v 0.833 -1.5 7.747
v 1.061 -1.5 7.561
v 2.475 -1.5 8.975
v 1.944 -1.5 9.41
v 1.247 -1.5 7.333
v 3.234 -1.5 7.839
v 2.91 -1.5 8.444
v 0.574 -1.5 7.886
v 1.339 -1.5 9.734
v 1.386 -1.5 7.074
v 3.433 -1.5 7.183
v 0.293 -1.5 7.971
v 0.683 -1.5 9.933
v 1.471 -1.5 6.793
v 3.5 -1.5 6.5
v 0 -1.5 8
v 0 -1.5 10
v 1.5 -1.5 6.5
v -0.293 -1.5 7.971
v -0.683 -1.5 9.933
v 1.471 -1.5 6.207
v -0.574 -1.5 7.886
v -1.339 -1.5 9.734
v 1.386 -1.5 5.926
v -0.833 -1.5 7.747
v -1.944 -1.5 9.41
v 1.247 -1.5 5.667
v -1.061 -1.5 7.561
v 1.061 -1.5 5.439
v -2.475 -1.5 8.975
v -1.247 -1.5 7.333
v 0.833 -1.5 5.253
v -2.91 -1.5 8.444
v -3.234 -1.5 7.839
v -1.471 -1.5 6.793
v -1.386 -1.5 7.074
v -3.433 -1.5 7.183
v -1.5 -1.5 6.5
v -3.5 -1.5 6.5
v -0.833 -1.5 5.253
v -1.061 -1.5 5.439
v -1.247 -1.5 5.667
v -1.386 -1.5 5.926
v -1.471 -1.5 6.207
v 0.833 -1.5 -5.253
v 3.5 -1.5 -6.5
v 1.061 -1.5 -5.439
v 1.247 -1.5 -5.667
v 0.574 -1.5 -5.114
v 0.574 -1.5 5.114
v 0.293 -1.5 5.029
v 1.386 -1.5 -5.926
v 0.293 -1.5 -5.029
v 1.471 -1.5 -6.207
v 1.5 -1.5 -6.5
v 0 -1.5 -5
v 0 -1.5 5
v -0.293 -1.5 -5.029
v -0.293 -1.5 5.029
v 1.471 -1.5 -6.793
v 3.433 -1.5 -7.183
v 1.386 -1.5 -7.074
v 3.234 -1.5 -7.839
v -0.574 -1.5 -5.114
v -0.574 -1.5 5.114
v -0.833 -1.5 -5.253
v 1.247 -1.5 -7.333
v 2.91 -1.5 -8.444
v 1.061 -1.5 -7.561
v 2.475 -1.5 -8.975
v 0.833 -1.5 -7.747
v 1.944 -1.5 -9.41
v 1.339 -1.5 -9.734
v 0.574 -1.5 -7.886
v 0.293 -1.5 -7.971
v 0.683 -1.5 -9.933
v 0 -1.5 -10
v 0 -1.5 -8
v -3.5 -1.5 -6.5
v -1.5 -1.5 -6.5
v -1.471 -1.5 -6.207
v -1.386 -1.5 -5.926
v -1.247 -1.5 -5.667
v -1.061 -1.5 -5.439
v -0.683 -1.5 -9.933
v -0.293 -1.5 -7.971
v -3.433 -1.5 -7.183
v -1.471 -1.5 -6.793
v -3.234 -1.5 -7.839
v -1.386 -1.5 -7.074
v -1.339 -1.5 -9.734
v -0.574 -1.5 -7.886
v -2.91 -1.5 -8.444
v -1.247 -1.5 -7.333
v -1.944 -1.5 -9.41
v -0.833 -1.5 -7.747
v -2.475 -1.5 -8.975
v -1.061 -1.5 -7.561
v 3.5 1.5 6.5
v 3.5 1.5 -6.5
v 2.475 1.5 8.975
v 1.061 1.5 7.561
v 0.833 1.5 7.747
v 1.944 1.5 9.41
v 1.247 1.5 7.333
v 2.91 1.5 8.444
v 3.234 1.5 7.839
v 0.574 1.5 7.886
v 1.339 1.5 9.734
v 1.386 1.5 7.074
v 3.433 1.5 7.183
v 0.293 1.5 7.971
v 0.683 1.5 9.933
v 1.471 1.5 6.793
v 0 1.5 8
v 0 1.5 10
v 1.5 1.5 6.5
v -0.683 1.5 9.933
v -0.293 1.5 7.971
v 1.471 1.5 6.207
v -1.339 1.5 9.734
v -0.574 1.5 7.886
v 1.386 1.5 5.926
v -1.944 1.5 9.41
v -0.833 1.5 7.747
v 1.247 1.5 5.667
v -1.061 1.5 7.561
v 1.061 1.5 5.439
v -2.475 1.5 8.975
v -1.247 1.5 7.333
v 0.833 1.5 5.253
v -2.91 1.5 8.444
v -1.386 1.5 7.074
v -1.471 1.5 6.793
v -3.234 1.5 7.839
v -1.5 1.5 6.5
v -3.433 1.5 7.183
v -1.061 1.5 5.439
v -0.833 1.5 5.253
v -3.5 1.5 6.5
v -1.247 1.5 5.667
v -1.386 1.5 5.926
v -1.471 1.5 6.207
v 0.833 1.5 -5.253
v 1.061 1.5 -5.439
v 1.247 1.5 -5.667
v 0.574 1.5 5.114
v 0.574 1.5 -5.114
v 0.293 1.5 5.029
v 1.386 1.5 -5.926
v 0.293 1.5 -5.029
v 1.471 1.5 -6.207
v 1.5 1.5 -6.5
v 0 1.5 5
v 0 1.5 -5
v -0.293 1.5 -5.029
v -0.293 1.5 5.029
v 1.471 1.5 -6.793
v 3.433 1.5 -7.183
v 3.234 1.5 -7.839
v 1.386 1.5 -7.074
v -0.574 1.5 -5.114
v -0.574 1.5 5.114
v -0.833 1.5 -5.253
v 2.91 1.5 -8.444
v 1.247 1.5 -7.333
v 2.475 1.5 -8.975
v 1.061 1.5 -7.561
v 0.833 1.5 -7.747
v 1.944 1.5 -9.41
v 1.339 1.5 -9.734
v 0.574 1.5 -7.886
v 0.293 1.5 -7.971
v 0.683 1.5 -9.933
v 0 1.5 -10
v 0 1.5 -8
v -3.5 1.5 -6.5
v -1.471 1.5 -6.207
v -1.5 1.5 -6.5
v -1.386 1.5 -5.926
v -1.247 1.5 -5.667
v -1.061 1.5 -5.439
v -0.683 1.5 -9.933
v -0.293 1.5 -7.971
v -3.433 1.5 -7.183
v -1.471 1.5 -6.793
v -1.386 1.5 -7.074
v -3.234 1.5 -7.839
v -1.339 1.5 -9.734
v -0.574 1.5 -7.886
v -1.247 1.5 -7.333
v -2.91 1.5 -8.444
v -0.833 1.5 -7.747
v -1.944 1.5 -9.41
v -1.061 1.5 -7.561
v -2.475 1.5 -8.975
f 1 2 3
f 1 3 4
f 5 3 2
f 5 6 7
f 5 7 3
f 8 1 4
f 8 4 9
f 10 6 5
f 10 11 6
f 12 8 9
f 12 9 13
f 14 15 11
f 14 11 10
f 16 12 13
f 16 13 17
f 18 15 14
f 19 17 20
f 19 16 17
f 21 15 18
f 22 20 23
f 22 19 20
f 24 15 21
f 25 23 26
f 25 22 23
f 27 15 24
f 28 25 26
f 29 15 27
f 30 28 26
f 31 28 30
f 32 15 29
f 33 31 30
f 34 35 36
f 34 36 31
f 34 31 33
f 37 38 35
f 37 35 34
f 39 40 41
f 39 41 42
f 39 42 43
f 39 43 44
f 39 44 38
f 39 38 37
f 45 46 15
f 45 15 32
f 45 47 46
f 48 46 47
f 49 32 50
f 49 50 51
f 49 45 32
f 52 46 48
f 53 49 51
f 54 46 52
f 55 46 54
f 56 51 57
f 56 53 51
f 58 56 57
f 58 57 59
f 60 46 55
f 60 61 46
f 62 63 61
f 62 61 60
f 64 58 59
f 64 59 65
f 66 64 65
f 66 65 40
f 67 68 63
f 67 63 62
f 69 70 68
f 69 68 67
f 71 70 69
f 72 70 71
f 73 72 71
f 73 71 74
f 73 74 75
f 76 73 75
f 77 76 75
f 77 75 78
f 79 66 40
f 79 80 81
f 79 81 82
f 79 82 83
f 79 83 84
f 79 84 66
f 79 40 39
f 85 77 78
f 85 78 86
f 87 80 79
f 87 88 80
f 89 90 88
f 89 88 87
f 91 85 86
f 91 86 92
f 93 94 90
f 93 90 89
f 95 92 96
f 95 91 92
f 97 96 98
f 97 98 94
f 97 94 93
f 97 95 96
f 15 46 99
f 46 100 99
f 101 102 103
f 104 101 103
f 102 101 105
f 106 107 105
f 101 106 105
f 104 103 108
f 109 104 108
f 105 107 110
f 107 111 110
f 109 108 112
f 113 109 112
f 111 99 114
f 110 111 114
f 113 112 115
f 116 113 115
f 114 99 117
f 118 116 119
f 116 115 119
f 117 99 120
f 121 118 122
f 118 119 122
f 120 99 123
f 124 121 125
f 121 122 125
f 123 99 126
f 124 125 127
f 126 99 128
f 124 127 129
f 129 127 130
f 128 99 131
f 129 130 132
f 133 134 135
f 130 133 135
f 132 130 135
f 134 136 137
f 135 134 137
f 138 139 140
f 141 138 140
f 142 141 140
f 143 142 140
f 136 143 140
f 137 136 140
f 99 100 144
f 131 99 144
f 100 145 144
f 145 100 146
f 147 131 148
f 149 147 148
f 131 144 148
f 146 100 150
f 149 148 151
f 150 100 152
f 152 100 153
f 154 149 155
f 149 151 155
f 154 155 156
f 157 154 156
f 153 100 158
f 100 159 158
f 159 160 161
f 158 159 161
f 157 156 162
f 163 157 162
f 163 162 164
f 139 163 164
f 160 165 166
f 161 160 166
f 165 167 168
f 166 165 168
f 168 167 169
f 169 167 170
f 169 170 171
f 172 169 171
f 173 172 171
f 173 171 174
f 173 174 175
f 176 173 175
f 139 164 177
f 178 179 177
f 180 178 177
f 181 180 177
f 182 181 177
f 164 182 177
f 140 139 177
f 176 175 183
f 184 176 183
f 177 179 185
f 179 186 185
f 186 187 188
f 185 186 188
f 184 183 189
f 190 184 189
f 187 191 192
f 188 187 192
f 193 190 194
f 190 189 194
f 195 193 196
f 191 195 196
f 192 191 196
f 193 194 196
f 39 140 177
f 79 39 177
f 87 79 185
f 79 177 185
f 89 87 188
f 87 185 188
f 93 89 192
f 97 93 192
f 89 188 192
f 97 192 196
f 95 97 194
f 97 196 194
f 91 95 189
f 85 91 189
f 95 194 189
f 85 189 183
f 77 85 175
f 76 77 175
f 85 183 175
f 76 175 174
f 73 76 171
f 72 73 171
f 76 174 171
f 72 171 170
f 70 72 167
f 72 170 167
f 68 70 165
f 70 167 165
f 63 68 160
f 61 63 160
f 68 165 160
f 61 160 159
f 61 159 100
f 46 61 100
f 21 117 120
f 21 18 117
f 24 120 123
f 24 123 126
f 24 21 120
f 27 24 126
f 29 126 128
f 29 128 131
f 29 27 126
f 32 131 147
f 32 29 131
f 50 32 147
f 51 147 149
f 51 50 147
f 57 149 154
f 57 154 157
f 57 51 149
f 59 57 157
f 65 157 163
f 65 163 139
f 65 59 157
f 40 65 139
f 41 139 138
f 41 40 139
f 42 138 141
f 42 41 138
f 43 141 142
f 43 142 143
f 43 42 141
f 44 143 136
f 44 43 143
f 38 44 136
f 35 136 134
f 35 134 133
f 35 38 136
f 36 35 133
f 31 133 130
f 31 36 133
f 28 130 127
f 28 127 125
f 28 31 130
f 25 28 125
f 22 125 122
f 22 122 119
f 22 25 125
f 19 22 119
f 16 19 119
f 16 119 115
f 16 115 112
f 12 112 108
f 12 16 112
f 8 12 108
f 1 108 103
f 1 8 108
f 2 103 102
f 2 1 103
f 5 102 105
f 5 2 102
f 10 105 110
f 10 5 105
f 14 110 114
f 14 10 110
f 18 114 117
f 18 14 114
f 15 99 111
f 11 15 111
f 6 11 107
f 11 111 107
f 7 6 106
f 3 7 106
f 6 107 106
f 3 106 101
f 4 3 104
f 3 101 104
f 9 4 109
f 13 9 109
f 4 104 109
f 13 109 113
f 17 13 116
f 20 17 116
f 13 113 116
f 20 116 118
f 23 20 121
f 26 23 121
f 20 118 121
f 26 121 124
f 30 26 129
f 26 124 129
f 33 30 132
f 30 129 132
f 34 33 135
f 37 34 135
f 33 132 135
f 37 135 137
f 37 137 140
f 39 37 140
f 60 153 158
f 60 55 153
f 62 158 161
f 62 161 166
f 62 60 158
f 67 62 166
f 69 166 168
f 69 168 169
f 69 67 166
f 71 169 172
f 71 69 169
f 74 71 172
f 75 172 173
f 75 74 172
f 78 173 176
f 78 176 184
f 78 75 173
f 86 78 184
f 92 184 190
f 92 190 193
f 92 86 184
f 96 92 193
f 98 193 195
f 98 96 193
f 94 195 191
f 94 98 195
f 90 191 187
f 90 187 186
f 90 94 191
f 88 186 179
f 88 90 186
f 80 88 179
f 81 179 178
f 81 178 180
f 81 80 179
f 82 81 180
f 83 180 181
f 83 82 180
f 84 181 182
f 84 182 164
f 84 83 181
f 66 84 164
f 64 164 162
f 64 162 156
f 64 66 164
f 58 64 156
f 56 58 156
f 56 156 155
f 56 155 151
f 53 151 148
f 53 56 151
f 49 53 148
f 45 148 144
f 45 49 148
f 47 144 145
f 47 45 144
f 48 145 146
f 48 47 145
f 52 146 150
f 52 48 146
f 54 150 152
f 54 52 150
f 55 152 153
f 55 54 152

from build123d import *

# Parameters (mm, degrees)
SKETCH1_R           = 1.5
BOSS_EXTRUDE1_DEPTH = 1.5


with BuildPart() as part:
    # Sketch1 → Boss-Extrude1 (new body, symmetric)
    with BuildSketch(Plane(origin=(0, 0, 0), x_dir=(1, 0, 0), z_dir=(0, 1, 0))):
        with BuildLine():
            Line((-3.5, -6.5), (-3.5, 6.5))
            ThreePointArc((-3.5, 6.5), (0, 10), (3.5, 6.5))
            Line((3.5, 6.5), (3.5, -6.5))
            ThreePointArc((3.5, -6.5), (0, -10), (-3.5, -6.5))
        make_face()
        with Locations((0, 6.5)):
            Circle(SKETCH1_R, mode=Mode.SUBTRACT)
        with Locations((0, -6.5)):
            Circle(SKETCH1_R, mode=Mode.SUBTRACT)
    extrude(amount=BOSS_EXTRUDE1_DEPTH, both=True)


solid = part.part
